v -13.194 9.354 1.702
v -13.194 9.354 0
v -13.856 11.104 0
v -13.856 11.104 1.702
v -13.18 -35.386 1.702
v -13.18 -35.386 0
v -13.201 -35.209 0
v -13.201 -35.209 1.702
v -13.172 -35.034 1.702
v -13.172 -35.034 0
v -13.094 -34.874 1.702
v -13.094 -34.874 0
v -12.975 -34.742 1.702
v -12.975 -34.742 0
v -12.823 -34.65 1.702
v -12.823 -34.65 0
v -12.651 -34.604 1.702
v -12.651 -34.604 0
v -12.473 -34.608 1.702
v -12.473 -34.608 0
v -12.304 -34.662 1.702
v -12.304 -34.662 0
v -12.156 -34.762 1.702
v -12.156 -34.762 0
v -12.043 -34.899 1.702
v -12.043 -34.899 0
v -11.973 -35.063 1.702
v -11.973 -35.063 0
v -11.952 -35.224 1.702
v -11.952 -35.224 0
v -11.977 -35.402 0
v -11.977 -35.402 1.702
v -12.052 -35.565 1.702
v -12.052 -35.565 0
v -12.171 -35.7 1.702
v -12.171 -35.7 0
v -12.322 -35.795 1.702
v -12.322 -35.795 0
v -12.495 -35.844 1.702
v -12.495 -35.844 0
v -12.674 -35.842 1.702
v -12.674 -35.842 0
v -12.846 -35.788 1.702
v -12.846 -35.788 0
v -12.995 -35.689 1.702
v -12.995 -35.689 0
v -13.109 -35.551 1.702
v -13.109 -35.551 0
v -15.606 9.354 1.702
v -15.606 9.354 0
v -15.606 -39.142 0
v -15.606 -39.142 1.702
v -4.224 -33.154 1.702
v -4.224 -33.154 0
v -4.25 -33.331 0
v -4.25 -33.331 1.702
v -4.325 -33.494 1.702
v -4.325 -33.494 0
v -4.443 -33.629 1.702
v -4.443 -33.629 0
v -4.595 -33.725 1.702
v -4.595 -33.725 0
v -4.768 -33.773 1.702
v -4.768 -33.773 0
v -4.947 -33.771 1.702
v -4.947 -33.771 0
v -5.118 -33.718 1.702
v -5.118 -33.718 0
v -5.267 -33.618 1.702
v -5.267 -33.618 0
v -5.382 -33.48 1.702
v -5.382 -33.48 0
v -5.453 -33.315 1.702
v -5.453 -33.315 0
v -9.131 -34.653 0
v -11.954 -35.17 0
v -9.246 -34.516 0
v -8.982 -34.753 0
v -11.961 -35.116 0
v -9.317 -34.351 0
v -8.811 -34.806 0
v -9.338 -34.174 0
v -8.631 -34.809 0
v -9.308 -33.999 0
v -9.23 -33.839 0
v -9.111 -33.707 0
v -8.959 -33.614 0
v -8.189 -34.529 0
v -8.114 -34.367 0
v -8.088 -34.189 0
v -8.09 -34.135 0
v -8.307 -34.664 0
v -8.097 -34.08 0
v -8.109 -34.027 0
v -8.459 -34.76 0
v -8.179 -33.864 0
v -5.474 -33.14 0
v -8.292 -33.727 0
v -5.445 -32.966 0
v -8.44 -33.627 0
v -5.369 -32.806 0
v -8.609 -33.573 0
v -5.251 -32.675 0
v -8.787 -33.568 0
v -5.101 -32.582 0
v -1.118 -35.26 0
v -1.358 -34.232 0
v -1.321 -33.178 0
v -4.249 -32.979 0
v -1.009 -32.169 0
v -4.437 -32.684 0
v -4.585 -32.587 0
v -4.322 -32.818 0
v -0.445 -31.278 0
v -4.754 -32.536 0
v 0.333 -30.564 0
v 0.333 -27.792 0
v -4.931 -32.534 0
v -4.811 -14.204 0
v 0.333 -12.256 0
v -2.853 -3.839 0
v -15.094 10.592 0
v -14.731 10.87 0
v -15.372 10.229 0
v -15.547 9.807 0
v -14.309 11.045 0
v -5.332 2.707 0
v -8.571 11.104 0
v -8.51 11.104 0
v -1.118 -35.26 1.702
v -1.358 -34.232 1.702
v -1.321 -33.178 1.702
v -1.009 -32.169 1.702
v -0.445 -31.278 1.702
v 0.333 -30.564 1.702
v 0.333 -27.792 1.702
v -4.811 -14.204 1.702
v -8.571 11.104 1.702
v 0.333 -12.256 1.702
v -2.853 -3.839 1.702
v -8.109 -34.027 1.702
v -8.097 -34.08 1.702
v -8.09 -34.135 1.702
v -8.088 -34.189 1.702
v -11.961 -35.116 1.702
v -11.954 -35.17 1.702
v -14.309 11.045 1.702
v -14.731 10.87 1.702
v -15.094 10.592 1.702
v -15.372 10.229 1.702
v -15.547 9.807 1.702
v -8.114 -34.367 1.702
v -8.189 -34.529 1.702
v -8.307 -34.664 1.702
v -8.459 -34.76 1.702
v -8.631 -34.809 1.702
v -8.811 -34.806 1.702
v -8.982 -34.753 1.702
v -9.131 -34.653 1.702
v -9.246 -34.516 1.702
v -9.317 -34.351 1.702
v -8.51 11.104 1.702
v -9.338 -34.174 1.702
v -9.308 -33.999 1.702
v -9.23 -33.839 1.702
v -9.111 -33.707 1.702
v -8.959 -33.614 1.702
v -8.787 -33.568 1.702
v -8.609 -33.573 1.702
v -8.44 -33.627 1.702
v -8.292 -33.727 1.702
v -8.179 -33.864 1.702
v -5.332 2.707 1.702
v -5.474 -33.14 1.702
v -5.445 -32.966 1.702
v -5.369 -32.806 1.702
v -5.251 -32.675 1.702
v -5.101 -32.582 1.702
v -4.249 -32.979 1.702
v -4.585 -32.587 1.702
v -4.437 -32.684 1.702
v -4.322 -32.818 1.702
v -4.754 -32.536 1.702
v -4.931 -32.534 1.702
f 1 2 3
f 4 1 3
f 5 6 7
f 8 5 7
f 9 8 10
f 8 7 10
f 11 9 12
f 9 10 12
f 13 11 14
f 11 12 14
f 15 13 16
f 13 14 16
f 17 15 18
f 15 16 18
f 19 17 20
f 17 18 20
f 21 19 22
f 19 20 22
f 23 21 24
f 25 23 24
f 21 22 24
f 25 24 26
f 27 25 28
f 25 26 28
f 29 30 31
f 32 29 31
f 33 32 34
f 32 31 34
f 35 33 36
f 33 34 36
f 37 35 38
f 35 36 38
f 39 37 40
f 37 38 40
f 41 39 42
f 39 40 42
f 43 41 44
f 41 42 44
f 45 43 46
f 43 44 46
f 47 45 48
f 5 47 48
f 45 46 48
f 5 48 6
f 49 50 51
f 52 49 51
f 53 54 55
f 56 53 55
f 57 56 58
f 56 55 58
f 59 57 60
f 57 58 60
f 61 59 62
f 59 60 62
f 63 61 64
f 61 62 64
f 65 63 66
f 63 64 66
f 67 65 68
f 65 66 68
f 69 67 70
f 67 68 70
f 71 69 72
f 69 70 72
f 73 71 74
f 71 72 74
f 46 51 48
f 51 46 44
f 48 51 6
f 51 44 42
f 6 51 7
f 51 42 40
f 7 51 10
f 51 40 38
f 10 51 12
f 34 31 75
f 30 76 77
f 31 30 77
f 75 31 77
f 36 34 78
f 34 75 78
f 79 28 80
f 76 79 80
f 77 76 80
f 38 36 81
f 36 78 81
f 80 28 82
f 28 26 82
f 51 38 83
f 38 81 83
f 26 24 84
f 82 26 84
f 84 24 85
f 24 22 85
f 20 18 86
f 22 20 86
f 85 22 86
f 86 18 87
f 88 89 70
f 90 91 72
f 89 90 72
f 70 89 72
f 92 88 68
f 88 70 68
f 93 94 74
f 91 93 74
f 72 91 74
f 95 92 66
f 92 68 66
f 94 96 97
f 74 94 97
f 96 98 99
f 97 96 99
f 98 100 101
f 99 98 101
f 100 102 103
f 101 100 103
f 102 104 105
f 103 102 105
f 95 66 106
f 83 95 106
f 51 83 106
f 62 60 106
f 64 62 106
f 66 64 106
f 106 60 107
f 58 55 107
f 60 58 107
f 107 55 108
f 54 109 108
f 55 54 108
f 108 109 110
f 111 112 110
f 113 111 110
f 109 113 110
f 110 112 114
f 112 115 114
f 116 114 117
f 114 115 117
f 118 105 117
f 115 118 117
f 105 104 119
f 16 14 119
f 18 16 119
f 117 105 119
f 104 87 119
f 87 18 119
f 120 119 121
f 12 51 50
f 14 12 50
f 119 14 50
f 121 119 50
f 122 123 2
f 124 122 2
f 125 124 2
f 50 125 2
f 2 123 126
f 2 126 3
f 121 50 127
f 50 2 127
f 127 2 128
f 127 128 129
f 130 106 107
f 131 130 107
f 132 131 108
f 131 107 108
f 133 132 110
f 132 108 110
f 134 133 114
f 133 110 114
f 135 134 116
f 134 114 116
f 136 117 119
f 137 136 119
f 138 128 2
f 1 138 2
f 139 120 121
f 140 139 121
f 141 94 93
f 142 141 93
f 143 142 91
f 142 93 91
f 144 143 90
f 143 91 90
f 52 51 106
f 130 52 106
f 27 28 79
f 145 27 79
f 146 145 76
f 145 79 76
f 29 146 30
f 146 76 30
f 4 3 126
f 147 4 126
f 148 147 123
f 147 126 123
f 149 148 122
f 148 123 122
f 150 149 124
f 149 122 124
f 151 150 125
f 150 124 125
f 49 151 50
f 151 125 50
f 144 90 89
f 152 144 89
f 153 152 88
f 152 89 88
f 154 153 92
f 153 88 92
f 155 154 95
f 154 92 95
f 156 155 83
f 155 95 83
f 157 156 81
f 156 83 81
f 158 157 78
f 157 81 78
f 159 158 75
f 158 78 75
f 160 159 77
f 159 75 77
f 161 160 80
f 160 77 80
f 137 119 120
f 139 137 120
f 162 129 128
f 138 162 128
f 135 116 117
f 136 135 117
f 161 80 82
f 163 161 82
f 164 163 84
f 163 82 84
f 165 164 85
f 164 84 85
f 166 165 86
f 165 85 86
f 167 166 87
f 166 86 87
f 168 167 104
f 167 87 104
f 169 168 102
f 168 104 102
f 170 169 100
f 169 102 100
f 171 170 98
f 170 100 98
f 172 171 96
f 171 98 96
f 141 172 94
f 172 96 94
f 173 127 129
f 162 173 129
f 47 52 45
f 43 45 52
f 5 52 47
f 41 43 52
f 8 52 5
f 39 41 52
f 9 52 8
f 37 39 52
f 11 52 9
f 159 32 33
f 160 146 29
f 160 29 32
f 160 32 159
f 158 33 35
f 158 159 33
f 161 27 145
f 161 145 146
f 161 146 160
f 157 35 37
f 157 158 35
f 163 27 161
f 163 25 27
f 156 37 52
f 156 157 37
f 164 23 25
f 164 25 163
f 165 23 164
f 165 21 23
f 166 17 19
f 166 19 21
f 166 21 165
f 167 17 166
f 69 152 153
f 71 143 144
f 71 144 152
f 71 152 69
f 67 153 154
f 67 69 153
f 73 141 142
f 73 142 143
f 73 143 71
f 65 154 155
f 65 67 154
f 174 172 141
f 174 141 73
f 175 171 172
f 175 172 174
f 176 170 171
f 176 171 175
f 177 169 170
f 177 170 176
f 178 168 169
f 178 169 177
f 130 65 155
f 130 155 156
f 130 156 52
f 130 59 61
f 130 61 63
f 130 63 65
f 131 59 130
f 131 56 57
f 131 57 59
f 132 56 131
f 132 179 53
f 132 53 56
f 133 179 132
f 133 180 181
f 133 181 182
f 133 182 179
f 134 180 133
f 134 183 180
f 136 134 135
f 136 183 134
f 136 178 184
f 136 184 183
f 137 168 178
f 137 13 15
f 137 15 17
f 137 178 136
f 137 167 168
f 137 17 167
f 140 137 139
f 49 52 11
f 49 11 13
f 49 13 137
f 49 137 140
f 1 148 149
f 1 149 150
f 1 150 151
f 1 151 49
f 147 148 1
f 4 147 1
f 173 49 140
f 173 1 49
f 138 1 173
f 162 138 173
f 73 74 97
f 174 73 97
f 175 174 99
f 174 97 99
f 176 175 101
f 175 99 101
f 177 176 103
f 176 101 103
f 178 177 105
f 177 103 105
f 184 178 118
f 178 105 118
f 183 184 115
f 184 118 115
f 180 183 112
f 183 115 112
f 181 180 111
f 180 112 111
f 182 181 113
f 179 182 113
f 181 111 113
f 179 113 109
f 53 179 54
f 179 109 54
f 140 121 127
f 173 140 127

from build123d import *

# Parameters (mm, degrees)
F1_DEPTH = 1.7018


with BuildPart() as f1:
    # F0 (on Top) → F1 (new body)
    with BuildSketch(Plane.XY):
        with BuildLine():
            Line((-13.194016, 9.354334), (-13.856456, 11.104334))
            ThreePointArc((-13.856456, 11.104334), (-15.093893, 10.591771), (-15.606456, 9.354334))
            Line((-15.606456, 9.354334), (-15.606456, -36.036127))
            Line((-15.606456, -36.036127), (-15.606456, -39.141956))
            Line((-15.606456, -39.141956), (-1.117569, -35.25967))
            ThreePointArc((-1.117569, -35.25967), (-1.198453, -32.663077), (0.332721, -30.564424))
            Line((0.332721, -30.564424), (0.332721, -27.792238))
            Line((0.332721, -27.792238), (-4.811083, -14.203604))
            Line((-4.811083, -14.203604), (0.332721, -12.256482))
            Line((0.332721, -12.256482), (-2.853478, -3.839349))
            Line((-2.853478, -3.839349), (-5.331632, 2.707311))
            Line((-5.331632, 2.707311), (-8.510218, 11.104334))
            Line((-8.510218, 11.104334), (-8.570957, 11.104334))
            Line((-8.570957, 11.104334), (-13.194016, 9.354334))
        make_face()
        with BuildLine():
            ThreePointArc((-11.951597, -35.224279), (-12.495019, -35.843932), (-13.180301, -35.386041))
            ThreePointArc((-13.180301, -35.386041), (-12.738359, -34.620576), (-11.972894, -35.062517))
            ThreePointArc((-11.972894, -35.062517), (-11.956944, -35.1427), (-11.951597, -35.224279))
        make_face(mode=Mode.SUBTRACT)
        with BuildLine():
            ThreePointArc((-8.087894, -34.189003), (-8.631315, -34.808656), (-9.316598, -34.350765))
            ThreePointArc((-9.316598, -34.350765), (-8.874656, -33.585299), (-8.10919, -34.027241))
            ThreePointArc((-8.10919, -34.027241), (-8.093241, -34.107424), (-8.087894, -34.189003))
        make_face(mode=Mode.SUBTRACT)
        with BuildLine():
            ThreePointArc((-4.224191, -33.153727), (-4.767612, -33.77338), (-5.452894, -33.315489))
            ThreePointArc((-5.452894, -33.315489), (-4.93077, -32.534074), (-4.224191, -33.153727))
        make_face(mode=Mode.SUBTRACT)
    extrude(amount=F1_DEPTH)


solid = f1.part
